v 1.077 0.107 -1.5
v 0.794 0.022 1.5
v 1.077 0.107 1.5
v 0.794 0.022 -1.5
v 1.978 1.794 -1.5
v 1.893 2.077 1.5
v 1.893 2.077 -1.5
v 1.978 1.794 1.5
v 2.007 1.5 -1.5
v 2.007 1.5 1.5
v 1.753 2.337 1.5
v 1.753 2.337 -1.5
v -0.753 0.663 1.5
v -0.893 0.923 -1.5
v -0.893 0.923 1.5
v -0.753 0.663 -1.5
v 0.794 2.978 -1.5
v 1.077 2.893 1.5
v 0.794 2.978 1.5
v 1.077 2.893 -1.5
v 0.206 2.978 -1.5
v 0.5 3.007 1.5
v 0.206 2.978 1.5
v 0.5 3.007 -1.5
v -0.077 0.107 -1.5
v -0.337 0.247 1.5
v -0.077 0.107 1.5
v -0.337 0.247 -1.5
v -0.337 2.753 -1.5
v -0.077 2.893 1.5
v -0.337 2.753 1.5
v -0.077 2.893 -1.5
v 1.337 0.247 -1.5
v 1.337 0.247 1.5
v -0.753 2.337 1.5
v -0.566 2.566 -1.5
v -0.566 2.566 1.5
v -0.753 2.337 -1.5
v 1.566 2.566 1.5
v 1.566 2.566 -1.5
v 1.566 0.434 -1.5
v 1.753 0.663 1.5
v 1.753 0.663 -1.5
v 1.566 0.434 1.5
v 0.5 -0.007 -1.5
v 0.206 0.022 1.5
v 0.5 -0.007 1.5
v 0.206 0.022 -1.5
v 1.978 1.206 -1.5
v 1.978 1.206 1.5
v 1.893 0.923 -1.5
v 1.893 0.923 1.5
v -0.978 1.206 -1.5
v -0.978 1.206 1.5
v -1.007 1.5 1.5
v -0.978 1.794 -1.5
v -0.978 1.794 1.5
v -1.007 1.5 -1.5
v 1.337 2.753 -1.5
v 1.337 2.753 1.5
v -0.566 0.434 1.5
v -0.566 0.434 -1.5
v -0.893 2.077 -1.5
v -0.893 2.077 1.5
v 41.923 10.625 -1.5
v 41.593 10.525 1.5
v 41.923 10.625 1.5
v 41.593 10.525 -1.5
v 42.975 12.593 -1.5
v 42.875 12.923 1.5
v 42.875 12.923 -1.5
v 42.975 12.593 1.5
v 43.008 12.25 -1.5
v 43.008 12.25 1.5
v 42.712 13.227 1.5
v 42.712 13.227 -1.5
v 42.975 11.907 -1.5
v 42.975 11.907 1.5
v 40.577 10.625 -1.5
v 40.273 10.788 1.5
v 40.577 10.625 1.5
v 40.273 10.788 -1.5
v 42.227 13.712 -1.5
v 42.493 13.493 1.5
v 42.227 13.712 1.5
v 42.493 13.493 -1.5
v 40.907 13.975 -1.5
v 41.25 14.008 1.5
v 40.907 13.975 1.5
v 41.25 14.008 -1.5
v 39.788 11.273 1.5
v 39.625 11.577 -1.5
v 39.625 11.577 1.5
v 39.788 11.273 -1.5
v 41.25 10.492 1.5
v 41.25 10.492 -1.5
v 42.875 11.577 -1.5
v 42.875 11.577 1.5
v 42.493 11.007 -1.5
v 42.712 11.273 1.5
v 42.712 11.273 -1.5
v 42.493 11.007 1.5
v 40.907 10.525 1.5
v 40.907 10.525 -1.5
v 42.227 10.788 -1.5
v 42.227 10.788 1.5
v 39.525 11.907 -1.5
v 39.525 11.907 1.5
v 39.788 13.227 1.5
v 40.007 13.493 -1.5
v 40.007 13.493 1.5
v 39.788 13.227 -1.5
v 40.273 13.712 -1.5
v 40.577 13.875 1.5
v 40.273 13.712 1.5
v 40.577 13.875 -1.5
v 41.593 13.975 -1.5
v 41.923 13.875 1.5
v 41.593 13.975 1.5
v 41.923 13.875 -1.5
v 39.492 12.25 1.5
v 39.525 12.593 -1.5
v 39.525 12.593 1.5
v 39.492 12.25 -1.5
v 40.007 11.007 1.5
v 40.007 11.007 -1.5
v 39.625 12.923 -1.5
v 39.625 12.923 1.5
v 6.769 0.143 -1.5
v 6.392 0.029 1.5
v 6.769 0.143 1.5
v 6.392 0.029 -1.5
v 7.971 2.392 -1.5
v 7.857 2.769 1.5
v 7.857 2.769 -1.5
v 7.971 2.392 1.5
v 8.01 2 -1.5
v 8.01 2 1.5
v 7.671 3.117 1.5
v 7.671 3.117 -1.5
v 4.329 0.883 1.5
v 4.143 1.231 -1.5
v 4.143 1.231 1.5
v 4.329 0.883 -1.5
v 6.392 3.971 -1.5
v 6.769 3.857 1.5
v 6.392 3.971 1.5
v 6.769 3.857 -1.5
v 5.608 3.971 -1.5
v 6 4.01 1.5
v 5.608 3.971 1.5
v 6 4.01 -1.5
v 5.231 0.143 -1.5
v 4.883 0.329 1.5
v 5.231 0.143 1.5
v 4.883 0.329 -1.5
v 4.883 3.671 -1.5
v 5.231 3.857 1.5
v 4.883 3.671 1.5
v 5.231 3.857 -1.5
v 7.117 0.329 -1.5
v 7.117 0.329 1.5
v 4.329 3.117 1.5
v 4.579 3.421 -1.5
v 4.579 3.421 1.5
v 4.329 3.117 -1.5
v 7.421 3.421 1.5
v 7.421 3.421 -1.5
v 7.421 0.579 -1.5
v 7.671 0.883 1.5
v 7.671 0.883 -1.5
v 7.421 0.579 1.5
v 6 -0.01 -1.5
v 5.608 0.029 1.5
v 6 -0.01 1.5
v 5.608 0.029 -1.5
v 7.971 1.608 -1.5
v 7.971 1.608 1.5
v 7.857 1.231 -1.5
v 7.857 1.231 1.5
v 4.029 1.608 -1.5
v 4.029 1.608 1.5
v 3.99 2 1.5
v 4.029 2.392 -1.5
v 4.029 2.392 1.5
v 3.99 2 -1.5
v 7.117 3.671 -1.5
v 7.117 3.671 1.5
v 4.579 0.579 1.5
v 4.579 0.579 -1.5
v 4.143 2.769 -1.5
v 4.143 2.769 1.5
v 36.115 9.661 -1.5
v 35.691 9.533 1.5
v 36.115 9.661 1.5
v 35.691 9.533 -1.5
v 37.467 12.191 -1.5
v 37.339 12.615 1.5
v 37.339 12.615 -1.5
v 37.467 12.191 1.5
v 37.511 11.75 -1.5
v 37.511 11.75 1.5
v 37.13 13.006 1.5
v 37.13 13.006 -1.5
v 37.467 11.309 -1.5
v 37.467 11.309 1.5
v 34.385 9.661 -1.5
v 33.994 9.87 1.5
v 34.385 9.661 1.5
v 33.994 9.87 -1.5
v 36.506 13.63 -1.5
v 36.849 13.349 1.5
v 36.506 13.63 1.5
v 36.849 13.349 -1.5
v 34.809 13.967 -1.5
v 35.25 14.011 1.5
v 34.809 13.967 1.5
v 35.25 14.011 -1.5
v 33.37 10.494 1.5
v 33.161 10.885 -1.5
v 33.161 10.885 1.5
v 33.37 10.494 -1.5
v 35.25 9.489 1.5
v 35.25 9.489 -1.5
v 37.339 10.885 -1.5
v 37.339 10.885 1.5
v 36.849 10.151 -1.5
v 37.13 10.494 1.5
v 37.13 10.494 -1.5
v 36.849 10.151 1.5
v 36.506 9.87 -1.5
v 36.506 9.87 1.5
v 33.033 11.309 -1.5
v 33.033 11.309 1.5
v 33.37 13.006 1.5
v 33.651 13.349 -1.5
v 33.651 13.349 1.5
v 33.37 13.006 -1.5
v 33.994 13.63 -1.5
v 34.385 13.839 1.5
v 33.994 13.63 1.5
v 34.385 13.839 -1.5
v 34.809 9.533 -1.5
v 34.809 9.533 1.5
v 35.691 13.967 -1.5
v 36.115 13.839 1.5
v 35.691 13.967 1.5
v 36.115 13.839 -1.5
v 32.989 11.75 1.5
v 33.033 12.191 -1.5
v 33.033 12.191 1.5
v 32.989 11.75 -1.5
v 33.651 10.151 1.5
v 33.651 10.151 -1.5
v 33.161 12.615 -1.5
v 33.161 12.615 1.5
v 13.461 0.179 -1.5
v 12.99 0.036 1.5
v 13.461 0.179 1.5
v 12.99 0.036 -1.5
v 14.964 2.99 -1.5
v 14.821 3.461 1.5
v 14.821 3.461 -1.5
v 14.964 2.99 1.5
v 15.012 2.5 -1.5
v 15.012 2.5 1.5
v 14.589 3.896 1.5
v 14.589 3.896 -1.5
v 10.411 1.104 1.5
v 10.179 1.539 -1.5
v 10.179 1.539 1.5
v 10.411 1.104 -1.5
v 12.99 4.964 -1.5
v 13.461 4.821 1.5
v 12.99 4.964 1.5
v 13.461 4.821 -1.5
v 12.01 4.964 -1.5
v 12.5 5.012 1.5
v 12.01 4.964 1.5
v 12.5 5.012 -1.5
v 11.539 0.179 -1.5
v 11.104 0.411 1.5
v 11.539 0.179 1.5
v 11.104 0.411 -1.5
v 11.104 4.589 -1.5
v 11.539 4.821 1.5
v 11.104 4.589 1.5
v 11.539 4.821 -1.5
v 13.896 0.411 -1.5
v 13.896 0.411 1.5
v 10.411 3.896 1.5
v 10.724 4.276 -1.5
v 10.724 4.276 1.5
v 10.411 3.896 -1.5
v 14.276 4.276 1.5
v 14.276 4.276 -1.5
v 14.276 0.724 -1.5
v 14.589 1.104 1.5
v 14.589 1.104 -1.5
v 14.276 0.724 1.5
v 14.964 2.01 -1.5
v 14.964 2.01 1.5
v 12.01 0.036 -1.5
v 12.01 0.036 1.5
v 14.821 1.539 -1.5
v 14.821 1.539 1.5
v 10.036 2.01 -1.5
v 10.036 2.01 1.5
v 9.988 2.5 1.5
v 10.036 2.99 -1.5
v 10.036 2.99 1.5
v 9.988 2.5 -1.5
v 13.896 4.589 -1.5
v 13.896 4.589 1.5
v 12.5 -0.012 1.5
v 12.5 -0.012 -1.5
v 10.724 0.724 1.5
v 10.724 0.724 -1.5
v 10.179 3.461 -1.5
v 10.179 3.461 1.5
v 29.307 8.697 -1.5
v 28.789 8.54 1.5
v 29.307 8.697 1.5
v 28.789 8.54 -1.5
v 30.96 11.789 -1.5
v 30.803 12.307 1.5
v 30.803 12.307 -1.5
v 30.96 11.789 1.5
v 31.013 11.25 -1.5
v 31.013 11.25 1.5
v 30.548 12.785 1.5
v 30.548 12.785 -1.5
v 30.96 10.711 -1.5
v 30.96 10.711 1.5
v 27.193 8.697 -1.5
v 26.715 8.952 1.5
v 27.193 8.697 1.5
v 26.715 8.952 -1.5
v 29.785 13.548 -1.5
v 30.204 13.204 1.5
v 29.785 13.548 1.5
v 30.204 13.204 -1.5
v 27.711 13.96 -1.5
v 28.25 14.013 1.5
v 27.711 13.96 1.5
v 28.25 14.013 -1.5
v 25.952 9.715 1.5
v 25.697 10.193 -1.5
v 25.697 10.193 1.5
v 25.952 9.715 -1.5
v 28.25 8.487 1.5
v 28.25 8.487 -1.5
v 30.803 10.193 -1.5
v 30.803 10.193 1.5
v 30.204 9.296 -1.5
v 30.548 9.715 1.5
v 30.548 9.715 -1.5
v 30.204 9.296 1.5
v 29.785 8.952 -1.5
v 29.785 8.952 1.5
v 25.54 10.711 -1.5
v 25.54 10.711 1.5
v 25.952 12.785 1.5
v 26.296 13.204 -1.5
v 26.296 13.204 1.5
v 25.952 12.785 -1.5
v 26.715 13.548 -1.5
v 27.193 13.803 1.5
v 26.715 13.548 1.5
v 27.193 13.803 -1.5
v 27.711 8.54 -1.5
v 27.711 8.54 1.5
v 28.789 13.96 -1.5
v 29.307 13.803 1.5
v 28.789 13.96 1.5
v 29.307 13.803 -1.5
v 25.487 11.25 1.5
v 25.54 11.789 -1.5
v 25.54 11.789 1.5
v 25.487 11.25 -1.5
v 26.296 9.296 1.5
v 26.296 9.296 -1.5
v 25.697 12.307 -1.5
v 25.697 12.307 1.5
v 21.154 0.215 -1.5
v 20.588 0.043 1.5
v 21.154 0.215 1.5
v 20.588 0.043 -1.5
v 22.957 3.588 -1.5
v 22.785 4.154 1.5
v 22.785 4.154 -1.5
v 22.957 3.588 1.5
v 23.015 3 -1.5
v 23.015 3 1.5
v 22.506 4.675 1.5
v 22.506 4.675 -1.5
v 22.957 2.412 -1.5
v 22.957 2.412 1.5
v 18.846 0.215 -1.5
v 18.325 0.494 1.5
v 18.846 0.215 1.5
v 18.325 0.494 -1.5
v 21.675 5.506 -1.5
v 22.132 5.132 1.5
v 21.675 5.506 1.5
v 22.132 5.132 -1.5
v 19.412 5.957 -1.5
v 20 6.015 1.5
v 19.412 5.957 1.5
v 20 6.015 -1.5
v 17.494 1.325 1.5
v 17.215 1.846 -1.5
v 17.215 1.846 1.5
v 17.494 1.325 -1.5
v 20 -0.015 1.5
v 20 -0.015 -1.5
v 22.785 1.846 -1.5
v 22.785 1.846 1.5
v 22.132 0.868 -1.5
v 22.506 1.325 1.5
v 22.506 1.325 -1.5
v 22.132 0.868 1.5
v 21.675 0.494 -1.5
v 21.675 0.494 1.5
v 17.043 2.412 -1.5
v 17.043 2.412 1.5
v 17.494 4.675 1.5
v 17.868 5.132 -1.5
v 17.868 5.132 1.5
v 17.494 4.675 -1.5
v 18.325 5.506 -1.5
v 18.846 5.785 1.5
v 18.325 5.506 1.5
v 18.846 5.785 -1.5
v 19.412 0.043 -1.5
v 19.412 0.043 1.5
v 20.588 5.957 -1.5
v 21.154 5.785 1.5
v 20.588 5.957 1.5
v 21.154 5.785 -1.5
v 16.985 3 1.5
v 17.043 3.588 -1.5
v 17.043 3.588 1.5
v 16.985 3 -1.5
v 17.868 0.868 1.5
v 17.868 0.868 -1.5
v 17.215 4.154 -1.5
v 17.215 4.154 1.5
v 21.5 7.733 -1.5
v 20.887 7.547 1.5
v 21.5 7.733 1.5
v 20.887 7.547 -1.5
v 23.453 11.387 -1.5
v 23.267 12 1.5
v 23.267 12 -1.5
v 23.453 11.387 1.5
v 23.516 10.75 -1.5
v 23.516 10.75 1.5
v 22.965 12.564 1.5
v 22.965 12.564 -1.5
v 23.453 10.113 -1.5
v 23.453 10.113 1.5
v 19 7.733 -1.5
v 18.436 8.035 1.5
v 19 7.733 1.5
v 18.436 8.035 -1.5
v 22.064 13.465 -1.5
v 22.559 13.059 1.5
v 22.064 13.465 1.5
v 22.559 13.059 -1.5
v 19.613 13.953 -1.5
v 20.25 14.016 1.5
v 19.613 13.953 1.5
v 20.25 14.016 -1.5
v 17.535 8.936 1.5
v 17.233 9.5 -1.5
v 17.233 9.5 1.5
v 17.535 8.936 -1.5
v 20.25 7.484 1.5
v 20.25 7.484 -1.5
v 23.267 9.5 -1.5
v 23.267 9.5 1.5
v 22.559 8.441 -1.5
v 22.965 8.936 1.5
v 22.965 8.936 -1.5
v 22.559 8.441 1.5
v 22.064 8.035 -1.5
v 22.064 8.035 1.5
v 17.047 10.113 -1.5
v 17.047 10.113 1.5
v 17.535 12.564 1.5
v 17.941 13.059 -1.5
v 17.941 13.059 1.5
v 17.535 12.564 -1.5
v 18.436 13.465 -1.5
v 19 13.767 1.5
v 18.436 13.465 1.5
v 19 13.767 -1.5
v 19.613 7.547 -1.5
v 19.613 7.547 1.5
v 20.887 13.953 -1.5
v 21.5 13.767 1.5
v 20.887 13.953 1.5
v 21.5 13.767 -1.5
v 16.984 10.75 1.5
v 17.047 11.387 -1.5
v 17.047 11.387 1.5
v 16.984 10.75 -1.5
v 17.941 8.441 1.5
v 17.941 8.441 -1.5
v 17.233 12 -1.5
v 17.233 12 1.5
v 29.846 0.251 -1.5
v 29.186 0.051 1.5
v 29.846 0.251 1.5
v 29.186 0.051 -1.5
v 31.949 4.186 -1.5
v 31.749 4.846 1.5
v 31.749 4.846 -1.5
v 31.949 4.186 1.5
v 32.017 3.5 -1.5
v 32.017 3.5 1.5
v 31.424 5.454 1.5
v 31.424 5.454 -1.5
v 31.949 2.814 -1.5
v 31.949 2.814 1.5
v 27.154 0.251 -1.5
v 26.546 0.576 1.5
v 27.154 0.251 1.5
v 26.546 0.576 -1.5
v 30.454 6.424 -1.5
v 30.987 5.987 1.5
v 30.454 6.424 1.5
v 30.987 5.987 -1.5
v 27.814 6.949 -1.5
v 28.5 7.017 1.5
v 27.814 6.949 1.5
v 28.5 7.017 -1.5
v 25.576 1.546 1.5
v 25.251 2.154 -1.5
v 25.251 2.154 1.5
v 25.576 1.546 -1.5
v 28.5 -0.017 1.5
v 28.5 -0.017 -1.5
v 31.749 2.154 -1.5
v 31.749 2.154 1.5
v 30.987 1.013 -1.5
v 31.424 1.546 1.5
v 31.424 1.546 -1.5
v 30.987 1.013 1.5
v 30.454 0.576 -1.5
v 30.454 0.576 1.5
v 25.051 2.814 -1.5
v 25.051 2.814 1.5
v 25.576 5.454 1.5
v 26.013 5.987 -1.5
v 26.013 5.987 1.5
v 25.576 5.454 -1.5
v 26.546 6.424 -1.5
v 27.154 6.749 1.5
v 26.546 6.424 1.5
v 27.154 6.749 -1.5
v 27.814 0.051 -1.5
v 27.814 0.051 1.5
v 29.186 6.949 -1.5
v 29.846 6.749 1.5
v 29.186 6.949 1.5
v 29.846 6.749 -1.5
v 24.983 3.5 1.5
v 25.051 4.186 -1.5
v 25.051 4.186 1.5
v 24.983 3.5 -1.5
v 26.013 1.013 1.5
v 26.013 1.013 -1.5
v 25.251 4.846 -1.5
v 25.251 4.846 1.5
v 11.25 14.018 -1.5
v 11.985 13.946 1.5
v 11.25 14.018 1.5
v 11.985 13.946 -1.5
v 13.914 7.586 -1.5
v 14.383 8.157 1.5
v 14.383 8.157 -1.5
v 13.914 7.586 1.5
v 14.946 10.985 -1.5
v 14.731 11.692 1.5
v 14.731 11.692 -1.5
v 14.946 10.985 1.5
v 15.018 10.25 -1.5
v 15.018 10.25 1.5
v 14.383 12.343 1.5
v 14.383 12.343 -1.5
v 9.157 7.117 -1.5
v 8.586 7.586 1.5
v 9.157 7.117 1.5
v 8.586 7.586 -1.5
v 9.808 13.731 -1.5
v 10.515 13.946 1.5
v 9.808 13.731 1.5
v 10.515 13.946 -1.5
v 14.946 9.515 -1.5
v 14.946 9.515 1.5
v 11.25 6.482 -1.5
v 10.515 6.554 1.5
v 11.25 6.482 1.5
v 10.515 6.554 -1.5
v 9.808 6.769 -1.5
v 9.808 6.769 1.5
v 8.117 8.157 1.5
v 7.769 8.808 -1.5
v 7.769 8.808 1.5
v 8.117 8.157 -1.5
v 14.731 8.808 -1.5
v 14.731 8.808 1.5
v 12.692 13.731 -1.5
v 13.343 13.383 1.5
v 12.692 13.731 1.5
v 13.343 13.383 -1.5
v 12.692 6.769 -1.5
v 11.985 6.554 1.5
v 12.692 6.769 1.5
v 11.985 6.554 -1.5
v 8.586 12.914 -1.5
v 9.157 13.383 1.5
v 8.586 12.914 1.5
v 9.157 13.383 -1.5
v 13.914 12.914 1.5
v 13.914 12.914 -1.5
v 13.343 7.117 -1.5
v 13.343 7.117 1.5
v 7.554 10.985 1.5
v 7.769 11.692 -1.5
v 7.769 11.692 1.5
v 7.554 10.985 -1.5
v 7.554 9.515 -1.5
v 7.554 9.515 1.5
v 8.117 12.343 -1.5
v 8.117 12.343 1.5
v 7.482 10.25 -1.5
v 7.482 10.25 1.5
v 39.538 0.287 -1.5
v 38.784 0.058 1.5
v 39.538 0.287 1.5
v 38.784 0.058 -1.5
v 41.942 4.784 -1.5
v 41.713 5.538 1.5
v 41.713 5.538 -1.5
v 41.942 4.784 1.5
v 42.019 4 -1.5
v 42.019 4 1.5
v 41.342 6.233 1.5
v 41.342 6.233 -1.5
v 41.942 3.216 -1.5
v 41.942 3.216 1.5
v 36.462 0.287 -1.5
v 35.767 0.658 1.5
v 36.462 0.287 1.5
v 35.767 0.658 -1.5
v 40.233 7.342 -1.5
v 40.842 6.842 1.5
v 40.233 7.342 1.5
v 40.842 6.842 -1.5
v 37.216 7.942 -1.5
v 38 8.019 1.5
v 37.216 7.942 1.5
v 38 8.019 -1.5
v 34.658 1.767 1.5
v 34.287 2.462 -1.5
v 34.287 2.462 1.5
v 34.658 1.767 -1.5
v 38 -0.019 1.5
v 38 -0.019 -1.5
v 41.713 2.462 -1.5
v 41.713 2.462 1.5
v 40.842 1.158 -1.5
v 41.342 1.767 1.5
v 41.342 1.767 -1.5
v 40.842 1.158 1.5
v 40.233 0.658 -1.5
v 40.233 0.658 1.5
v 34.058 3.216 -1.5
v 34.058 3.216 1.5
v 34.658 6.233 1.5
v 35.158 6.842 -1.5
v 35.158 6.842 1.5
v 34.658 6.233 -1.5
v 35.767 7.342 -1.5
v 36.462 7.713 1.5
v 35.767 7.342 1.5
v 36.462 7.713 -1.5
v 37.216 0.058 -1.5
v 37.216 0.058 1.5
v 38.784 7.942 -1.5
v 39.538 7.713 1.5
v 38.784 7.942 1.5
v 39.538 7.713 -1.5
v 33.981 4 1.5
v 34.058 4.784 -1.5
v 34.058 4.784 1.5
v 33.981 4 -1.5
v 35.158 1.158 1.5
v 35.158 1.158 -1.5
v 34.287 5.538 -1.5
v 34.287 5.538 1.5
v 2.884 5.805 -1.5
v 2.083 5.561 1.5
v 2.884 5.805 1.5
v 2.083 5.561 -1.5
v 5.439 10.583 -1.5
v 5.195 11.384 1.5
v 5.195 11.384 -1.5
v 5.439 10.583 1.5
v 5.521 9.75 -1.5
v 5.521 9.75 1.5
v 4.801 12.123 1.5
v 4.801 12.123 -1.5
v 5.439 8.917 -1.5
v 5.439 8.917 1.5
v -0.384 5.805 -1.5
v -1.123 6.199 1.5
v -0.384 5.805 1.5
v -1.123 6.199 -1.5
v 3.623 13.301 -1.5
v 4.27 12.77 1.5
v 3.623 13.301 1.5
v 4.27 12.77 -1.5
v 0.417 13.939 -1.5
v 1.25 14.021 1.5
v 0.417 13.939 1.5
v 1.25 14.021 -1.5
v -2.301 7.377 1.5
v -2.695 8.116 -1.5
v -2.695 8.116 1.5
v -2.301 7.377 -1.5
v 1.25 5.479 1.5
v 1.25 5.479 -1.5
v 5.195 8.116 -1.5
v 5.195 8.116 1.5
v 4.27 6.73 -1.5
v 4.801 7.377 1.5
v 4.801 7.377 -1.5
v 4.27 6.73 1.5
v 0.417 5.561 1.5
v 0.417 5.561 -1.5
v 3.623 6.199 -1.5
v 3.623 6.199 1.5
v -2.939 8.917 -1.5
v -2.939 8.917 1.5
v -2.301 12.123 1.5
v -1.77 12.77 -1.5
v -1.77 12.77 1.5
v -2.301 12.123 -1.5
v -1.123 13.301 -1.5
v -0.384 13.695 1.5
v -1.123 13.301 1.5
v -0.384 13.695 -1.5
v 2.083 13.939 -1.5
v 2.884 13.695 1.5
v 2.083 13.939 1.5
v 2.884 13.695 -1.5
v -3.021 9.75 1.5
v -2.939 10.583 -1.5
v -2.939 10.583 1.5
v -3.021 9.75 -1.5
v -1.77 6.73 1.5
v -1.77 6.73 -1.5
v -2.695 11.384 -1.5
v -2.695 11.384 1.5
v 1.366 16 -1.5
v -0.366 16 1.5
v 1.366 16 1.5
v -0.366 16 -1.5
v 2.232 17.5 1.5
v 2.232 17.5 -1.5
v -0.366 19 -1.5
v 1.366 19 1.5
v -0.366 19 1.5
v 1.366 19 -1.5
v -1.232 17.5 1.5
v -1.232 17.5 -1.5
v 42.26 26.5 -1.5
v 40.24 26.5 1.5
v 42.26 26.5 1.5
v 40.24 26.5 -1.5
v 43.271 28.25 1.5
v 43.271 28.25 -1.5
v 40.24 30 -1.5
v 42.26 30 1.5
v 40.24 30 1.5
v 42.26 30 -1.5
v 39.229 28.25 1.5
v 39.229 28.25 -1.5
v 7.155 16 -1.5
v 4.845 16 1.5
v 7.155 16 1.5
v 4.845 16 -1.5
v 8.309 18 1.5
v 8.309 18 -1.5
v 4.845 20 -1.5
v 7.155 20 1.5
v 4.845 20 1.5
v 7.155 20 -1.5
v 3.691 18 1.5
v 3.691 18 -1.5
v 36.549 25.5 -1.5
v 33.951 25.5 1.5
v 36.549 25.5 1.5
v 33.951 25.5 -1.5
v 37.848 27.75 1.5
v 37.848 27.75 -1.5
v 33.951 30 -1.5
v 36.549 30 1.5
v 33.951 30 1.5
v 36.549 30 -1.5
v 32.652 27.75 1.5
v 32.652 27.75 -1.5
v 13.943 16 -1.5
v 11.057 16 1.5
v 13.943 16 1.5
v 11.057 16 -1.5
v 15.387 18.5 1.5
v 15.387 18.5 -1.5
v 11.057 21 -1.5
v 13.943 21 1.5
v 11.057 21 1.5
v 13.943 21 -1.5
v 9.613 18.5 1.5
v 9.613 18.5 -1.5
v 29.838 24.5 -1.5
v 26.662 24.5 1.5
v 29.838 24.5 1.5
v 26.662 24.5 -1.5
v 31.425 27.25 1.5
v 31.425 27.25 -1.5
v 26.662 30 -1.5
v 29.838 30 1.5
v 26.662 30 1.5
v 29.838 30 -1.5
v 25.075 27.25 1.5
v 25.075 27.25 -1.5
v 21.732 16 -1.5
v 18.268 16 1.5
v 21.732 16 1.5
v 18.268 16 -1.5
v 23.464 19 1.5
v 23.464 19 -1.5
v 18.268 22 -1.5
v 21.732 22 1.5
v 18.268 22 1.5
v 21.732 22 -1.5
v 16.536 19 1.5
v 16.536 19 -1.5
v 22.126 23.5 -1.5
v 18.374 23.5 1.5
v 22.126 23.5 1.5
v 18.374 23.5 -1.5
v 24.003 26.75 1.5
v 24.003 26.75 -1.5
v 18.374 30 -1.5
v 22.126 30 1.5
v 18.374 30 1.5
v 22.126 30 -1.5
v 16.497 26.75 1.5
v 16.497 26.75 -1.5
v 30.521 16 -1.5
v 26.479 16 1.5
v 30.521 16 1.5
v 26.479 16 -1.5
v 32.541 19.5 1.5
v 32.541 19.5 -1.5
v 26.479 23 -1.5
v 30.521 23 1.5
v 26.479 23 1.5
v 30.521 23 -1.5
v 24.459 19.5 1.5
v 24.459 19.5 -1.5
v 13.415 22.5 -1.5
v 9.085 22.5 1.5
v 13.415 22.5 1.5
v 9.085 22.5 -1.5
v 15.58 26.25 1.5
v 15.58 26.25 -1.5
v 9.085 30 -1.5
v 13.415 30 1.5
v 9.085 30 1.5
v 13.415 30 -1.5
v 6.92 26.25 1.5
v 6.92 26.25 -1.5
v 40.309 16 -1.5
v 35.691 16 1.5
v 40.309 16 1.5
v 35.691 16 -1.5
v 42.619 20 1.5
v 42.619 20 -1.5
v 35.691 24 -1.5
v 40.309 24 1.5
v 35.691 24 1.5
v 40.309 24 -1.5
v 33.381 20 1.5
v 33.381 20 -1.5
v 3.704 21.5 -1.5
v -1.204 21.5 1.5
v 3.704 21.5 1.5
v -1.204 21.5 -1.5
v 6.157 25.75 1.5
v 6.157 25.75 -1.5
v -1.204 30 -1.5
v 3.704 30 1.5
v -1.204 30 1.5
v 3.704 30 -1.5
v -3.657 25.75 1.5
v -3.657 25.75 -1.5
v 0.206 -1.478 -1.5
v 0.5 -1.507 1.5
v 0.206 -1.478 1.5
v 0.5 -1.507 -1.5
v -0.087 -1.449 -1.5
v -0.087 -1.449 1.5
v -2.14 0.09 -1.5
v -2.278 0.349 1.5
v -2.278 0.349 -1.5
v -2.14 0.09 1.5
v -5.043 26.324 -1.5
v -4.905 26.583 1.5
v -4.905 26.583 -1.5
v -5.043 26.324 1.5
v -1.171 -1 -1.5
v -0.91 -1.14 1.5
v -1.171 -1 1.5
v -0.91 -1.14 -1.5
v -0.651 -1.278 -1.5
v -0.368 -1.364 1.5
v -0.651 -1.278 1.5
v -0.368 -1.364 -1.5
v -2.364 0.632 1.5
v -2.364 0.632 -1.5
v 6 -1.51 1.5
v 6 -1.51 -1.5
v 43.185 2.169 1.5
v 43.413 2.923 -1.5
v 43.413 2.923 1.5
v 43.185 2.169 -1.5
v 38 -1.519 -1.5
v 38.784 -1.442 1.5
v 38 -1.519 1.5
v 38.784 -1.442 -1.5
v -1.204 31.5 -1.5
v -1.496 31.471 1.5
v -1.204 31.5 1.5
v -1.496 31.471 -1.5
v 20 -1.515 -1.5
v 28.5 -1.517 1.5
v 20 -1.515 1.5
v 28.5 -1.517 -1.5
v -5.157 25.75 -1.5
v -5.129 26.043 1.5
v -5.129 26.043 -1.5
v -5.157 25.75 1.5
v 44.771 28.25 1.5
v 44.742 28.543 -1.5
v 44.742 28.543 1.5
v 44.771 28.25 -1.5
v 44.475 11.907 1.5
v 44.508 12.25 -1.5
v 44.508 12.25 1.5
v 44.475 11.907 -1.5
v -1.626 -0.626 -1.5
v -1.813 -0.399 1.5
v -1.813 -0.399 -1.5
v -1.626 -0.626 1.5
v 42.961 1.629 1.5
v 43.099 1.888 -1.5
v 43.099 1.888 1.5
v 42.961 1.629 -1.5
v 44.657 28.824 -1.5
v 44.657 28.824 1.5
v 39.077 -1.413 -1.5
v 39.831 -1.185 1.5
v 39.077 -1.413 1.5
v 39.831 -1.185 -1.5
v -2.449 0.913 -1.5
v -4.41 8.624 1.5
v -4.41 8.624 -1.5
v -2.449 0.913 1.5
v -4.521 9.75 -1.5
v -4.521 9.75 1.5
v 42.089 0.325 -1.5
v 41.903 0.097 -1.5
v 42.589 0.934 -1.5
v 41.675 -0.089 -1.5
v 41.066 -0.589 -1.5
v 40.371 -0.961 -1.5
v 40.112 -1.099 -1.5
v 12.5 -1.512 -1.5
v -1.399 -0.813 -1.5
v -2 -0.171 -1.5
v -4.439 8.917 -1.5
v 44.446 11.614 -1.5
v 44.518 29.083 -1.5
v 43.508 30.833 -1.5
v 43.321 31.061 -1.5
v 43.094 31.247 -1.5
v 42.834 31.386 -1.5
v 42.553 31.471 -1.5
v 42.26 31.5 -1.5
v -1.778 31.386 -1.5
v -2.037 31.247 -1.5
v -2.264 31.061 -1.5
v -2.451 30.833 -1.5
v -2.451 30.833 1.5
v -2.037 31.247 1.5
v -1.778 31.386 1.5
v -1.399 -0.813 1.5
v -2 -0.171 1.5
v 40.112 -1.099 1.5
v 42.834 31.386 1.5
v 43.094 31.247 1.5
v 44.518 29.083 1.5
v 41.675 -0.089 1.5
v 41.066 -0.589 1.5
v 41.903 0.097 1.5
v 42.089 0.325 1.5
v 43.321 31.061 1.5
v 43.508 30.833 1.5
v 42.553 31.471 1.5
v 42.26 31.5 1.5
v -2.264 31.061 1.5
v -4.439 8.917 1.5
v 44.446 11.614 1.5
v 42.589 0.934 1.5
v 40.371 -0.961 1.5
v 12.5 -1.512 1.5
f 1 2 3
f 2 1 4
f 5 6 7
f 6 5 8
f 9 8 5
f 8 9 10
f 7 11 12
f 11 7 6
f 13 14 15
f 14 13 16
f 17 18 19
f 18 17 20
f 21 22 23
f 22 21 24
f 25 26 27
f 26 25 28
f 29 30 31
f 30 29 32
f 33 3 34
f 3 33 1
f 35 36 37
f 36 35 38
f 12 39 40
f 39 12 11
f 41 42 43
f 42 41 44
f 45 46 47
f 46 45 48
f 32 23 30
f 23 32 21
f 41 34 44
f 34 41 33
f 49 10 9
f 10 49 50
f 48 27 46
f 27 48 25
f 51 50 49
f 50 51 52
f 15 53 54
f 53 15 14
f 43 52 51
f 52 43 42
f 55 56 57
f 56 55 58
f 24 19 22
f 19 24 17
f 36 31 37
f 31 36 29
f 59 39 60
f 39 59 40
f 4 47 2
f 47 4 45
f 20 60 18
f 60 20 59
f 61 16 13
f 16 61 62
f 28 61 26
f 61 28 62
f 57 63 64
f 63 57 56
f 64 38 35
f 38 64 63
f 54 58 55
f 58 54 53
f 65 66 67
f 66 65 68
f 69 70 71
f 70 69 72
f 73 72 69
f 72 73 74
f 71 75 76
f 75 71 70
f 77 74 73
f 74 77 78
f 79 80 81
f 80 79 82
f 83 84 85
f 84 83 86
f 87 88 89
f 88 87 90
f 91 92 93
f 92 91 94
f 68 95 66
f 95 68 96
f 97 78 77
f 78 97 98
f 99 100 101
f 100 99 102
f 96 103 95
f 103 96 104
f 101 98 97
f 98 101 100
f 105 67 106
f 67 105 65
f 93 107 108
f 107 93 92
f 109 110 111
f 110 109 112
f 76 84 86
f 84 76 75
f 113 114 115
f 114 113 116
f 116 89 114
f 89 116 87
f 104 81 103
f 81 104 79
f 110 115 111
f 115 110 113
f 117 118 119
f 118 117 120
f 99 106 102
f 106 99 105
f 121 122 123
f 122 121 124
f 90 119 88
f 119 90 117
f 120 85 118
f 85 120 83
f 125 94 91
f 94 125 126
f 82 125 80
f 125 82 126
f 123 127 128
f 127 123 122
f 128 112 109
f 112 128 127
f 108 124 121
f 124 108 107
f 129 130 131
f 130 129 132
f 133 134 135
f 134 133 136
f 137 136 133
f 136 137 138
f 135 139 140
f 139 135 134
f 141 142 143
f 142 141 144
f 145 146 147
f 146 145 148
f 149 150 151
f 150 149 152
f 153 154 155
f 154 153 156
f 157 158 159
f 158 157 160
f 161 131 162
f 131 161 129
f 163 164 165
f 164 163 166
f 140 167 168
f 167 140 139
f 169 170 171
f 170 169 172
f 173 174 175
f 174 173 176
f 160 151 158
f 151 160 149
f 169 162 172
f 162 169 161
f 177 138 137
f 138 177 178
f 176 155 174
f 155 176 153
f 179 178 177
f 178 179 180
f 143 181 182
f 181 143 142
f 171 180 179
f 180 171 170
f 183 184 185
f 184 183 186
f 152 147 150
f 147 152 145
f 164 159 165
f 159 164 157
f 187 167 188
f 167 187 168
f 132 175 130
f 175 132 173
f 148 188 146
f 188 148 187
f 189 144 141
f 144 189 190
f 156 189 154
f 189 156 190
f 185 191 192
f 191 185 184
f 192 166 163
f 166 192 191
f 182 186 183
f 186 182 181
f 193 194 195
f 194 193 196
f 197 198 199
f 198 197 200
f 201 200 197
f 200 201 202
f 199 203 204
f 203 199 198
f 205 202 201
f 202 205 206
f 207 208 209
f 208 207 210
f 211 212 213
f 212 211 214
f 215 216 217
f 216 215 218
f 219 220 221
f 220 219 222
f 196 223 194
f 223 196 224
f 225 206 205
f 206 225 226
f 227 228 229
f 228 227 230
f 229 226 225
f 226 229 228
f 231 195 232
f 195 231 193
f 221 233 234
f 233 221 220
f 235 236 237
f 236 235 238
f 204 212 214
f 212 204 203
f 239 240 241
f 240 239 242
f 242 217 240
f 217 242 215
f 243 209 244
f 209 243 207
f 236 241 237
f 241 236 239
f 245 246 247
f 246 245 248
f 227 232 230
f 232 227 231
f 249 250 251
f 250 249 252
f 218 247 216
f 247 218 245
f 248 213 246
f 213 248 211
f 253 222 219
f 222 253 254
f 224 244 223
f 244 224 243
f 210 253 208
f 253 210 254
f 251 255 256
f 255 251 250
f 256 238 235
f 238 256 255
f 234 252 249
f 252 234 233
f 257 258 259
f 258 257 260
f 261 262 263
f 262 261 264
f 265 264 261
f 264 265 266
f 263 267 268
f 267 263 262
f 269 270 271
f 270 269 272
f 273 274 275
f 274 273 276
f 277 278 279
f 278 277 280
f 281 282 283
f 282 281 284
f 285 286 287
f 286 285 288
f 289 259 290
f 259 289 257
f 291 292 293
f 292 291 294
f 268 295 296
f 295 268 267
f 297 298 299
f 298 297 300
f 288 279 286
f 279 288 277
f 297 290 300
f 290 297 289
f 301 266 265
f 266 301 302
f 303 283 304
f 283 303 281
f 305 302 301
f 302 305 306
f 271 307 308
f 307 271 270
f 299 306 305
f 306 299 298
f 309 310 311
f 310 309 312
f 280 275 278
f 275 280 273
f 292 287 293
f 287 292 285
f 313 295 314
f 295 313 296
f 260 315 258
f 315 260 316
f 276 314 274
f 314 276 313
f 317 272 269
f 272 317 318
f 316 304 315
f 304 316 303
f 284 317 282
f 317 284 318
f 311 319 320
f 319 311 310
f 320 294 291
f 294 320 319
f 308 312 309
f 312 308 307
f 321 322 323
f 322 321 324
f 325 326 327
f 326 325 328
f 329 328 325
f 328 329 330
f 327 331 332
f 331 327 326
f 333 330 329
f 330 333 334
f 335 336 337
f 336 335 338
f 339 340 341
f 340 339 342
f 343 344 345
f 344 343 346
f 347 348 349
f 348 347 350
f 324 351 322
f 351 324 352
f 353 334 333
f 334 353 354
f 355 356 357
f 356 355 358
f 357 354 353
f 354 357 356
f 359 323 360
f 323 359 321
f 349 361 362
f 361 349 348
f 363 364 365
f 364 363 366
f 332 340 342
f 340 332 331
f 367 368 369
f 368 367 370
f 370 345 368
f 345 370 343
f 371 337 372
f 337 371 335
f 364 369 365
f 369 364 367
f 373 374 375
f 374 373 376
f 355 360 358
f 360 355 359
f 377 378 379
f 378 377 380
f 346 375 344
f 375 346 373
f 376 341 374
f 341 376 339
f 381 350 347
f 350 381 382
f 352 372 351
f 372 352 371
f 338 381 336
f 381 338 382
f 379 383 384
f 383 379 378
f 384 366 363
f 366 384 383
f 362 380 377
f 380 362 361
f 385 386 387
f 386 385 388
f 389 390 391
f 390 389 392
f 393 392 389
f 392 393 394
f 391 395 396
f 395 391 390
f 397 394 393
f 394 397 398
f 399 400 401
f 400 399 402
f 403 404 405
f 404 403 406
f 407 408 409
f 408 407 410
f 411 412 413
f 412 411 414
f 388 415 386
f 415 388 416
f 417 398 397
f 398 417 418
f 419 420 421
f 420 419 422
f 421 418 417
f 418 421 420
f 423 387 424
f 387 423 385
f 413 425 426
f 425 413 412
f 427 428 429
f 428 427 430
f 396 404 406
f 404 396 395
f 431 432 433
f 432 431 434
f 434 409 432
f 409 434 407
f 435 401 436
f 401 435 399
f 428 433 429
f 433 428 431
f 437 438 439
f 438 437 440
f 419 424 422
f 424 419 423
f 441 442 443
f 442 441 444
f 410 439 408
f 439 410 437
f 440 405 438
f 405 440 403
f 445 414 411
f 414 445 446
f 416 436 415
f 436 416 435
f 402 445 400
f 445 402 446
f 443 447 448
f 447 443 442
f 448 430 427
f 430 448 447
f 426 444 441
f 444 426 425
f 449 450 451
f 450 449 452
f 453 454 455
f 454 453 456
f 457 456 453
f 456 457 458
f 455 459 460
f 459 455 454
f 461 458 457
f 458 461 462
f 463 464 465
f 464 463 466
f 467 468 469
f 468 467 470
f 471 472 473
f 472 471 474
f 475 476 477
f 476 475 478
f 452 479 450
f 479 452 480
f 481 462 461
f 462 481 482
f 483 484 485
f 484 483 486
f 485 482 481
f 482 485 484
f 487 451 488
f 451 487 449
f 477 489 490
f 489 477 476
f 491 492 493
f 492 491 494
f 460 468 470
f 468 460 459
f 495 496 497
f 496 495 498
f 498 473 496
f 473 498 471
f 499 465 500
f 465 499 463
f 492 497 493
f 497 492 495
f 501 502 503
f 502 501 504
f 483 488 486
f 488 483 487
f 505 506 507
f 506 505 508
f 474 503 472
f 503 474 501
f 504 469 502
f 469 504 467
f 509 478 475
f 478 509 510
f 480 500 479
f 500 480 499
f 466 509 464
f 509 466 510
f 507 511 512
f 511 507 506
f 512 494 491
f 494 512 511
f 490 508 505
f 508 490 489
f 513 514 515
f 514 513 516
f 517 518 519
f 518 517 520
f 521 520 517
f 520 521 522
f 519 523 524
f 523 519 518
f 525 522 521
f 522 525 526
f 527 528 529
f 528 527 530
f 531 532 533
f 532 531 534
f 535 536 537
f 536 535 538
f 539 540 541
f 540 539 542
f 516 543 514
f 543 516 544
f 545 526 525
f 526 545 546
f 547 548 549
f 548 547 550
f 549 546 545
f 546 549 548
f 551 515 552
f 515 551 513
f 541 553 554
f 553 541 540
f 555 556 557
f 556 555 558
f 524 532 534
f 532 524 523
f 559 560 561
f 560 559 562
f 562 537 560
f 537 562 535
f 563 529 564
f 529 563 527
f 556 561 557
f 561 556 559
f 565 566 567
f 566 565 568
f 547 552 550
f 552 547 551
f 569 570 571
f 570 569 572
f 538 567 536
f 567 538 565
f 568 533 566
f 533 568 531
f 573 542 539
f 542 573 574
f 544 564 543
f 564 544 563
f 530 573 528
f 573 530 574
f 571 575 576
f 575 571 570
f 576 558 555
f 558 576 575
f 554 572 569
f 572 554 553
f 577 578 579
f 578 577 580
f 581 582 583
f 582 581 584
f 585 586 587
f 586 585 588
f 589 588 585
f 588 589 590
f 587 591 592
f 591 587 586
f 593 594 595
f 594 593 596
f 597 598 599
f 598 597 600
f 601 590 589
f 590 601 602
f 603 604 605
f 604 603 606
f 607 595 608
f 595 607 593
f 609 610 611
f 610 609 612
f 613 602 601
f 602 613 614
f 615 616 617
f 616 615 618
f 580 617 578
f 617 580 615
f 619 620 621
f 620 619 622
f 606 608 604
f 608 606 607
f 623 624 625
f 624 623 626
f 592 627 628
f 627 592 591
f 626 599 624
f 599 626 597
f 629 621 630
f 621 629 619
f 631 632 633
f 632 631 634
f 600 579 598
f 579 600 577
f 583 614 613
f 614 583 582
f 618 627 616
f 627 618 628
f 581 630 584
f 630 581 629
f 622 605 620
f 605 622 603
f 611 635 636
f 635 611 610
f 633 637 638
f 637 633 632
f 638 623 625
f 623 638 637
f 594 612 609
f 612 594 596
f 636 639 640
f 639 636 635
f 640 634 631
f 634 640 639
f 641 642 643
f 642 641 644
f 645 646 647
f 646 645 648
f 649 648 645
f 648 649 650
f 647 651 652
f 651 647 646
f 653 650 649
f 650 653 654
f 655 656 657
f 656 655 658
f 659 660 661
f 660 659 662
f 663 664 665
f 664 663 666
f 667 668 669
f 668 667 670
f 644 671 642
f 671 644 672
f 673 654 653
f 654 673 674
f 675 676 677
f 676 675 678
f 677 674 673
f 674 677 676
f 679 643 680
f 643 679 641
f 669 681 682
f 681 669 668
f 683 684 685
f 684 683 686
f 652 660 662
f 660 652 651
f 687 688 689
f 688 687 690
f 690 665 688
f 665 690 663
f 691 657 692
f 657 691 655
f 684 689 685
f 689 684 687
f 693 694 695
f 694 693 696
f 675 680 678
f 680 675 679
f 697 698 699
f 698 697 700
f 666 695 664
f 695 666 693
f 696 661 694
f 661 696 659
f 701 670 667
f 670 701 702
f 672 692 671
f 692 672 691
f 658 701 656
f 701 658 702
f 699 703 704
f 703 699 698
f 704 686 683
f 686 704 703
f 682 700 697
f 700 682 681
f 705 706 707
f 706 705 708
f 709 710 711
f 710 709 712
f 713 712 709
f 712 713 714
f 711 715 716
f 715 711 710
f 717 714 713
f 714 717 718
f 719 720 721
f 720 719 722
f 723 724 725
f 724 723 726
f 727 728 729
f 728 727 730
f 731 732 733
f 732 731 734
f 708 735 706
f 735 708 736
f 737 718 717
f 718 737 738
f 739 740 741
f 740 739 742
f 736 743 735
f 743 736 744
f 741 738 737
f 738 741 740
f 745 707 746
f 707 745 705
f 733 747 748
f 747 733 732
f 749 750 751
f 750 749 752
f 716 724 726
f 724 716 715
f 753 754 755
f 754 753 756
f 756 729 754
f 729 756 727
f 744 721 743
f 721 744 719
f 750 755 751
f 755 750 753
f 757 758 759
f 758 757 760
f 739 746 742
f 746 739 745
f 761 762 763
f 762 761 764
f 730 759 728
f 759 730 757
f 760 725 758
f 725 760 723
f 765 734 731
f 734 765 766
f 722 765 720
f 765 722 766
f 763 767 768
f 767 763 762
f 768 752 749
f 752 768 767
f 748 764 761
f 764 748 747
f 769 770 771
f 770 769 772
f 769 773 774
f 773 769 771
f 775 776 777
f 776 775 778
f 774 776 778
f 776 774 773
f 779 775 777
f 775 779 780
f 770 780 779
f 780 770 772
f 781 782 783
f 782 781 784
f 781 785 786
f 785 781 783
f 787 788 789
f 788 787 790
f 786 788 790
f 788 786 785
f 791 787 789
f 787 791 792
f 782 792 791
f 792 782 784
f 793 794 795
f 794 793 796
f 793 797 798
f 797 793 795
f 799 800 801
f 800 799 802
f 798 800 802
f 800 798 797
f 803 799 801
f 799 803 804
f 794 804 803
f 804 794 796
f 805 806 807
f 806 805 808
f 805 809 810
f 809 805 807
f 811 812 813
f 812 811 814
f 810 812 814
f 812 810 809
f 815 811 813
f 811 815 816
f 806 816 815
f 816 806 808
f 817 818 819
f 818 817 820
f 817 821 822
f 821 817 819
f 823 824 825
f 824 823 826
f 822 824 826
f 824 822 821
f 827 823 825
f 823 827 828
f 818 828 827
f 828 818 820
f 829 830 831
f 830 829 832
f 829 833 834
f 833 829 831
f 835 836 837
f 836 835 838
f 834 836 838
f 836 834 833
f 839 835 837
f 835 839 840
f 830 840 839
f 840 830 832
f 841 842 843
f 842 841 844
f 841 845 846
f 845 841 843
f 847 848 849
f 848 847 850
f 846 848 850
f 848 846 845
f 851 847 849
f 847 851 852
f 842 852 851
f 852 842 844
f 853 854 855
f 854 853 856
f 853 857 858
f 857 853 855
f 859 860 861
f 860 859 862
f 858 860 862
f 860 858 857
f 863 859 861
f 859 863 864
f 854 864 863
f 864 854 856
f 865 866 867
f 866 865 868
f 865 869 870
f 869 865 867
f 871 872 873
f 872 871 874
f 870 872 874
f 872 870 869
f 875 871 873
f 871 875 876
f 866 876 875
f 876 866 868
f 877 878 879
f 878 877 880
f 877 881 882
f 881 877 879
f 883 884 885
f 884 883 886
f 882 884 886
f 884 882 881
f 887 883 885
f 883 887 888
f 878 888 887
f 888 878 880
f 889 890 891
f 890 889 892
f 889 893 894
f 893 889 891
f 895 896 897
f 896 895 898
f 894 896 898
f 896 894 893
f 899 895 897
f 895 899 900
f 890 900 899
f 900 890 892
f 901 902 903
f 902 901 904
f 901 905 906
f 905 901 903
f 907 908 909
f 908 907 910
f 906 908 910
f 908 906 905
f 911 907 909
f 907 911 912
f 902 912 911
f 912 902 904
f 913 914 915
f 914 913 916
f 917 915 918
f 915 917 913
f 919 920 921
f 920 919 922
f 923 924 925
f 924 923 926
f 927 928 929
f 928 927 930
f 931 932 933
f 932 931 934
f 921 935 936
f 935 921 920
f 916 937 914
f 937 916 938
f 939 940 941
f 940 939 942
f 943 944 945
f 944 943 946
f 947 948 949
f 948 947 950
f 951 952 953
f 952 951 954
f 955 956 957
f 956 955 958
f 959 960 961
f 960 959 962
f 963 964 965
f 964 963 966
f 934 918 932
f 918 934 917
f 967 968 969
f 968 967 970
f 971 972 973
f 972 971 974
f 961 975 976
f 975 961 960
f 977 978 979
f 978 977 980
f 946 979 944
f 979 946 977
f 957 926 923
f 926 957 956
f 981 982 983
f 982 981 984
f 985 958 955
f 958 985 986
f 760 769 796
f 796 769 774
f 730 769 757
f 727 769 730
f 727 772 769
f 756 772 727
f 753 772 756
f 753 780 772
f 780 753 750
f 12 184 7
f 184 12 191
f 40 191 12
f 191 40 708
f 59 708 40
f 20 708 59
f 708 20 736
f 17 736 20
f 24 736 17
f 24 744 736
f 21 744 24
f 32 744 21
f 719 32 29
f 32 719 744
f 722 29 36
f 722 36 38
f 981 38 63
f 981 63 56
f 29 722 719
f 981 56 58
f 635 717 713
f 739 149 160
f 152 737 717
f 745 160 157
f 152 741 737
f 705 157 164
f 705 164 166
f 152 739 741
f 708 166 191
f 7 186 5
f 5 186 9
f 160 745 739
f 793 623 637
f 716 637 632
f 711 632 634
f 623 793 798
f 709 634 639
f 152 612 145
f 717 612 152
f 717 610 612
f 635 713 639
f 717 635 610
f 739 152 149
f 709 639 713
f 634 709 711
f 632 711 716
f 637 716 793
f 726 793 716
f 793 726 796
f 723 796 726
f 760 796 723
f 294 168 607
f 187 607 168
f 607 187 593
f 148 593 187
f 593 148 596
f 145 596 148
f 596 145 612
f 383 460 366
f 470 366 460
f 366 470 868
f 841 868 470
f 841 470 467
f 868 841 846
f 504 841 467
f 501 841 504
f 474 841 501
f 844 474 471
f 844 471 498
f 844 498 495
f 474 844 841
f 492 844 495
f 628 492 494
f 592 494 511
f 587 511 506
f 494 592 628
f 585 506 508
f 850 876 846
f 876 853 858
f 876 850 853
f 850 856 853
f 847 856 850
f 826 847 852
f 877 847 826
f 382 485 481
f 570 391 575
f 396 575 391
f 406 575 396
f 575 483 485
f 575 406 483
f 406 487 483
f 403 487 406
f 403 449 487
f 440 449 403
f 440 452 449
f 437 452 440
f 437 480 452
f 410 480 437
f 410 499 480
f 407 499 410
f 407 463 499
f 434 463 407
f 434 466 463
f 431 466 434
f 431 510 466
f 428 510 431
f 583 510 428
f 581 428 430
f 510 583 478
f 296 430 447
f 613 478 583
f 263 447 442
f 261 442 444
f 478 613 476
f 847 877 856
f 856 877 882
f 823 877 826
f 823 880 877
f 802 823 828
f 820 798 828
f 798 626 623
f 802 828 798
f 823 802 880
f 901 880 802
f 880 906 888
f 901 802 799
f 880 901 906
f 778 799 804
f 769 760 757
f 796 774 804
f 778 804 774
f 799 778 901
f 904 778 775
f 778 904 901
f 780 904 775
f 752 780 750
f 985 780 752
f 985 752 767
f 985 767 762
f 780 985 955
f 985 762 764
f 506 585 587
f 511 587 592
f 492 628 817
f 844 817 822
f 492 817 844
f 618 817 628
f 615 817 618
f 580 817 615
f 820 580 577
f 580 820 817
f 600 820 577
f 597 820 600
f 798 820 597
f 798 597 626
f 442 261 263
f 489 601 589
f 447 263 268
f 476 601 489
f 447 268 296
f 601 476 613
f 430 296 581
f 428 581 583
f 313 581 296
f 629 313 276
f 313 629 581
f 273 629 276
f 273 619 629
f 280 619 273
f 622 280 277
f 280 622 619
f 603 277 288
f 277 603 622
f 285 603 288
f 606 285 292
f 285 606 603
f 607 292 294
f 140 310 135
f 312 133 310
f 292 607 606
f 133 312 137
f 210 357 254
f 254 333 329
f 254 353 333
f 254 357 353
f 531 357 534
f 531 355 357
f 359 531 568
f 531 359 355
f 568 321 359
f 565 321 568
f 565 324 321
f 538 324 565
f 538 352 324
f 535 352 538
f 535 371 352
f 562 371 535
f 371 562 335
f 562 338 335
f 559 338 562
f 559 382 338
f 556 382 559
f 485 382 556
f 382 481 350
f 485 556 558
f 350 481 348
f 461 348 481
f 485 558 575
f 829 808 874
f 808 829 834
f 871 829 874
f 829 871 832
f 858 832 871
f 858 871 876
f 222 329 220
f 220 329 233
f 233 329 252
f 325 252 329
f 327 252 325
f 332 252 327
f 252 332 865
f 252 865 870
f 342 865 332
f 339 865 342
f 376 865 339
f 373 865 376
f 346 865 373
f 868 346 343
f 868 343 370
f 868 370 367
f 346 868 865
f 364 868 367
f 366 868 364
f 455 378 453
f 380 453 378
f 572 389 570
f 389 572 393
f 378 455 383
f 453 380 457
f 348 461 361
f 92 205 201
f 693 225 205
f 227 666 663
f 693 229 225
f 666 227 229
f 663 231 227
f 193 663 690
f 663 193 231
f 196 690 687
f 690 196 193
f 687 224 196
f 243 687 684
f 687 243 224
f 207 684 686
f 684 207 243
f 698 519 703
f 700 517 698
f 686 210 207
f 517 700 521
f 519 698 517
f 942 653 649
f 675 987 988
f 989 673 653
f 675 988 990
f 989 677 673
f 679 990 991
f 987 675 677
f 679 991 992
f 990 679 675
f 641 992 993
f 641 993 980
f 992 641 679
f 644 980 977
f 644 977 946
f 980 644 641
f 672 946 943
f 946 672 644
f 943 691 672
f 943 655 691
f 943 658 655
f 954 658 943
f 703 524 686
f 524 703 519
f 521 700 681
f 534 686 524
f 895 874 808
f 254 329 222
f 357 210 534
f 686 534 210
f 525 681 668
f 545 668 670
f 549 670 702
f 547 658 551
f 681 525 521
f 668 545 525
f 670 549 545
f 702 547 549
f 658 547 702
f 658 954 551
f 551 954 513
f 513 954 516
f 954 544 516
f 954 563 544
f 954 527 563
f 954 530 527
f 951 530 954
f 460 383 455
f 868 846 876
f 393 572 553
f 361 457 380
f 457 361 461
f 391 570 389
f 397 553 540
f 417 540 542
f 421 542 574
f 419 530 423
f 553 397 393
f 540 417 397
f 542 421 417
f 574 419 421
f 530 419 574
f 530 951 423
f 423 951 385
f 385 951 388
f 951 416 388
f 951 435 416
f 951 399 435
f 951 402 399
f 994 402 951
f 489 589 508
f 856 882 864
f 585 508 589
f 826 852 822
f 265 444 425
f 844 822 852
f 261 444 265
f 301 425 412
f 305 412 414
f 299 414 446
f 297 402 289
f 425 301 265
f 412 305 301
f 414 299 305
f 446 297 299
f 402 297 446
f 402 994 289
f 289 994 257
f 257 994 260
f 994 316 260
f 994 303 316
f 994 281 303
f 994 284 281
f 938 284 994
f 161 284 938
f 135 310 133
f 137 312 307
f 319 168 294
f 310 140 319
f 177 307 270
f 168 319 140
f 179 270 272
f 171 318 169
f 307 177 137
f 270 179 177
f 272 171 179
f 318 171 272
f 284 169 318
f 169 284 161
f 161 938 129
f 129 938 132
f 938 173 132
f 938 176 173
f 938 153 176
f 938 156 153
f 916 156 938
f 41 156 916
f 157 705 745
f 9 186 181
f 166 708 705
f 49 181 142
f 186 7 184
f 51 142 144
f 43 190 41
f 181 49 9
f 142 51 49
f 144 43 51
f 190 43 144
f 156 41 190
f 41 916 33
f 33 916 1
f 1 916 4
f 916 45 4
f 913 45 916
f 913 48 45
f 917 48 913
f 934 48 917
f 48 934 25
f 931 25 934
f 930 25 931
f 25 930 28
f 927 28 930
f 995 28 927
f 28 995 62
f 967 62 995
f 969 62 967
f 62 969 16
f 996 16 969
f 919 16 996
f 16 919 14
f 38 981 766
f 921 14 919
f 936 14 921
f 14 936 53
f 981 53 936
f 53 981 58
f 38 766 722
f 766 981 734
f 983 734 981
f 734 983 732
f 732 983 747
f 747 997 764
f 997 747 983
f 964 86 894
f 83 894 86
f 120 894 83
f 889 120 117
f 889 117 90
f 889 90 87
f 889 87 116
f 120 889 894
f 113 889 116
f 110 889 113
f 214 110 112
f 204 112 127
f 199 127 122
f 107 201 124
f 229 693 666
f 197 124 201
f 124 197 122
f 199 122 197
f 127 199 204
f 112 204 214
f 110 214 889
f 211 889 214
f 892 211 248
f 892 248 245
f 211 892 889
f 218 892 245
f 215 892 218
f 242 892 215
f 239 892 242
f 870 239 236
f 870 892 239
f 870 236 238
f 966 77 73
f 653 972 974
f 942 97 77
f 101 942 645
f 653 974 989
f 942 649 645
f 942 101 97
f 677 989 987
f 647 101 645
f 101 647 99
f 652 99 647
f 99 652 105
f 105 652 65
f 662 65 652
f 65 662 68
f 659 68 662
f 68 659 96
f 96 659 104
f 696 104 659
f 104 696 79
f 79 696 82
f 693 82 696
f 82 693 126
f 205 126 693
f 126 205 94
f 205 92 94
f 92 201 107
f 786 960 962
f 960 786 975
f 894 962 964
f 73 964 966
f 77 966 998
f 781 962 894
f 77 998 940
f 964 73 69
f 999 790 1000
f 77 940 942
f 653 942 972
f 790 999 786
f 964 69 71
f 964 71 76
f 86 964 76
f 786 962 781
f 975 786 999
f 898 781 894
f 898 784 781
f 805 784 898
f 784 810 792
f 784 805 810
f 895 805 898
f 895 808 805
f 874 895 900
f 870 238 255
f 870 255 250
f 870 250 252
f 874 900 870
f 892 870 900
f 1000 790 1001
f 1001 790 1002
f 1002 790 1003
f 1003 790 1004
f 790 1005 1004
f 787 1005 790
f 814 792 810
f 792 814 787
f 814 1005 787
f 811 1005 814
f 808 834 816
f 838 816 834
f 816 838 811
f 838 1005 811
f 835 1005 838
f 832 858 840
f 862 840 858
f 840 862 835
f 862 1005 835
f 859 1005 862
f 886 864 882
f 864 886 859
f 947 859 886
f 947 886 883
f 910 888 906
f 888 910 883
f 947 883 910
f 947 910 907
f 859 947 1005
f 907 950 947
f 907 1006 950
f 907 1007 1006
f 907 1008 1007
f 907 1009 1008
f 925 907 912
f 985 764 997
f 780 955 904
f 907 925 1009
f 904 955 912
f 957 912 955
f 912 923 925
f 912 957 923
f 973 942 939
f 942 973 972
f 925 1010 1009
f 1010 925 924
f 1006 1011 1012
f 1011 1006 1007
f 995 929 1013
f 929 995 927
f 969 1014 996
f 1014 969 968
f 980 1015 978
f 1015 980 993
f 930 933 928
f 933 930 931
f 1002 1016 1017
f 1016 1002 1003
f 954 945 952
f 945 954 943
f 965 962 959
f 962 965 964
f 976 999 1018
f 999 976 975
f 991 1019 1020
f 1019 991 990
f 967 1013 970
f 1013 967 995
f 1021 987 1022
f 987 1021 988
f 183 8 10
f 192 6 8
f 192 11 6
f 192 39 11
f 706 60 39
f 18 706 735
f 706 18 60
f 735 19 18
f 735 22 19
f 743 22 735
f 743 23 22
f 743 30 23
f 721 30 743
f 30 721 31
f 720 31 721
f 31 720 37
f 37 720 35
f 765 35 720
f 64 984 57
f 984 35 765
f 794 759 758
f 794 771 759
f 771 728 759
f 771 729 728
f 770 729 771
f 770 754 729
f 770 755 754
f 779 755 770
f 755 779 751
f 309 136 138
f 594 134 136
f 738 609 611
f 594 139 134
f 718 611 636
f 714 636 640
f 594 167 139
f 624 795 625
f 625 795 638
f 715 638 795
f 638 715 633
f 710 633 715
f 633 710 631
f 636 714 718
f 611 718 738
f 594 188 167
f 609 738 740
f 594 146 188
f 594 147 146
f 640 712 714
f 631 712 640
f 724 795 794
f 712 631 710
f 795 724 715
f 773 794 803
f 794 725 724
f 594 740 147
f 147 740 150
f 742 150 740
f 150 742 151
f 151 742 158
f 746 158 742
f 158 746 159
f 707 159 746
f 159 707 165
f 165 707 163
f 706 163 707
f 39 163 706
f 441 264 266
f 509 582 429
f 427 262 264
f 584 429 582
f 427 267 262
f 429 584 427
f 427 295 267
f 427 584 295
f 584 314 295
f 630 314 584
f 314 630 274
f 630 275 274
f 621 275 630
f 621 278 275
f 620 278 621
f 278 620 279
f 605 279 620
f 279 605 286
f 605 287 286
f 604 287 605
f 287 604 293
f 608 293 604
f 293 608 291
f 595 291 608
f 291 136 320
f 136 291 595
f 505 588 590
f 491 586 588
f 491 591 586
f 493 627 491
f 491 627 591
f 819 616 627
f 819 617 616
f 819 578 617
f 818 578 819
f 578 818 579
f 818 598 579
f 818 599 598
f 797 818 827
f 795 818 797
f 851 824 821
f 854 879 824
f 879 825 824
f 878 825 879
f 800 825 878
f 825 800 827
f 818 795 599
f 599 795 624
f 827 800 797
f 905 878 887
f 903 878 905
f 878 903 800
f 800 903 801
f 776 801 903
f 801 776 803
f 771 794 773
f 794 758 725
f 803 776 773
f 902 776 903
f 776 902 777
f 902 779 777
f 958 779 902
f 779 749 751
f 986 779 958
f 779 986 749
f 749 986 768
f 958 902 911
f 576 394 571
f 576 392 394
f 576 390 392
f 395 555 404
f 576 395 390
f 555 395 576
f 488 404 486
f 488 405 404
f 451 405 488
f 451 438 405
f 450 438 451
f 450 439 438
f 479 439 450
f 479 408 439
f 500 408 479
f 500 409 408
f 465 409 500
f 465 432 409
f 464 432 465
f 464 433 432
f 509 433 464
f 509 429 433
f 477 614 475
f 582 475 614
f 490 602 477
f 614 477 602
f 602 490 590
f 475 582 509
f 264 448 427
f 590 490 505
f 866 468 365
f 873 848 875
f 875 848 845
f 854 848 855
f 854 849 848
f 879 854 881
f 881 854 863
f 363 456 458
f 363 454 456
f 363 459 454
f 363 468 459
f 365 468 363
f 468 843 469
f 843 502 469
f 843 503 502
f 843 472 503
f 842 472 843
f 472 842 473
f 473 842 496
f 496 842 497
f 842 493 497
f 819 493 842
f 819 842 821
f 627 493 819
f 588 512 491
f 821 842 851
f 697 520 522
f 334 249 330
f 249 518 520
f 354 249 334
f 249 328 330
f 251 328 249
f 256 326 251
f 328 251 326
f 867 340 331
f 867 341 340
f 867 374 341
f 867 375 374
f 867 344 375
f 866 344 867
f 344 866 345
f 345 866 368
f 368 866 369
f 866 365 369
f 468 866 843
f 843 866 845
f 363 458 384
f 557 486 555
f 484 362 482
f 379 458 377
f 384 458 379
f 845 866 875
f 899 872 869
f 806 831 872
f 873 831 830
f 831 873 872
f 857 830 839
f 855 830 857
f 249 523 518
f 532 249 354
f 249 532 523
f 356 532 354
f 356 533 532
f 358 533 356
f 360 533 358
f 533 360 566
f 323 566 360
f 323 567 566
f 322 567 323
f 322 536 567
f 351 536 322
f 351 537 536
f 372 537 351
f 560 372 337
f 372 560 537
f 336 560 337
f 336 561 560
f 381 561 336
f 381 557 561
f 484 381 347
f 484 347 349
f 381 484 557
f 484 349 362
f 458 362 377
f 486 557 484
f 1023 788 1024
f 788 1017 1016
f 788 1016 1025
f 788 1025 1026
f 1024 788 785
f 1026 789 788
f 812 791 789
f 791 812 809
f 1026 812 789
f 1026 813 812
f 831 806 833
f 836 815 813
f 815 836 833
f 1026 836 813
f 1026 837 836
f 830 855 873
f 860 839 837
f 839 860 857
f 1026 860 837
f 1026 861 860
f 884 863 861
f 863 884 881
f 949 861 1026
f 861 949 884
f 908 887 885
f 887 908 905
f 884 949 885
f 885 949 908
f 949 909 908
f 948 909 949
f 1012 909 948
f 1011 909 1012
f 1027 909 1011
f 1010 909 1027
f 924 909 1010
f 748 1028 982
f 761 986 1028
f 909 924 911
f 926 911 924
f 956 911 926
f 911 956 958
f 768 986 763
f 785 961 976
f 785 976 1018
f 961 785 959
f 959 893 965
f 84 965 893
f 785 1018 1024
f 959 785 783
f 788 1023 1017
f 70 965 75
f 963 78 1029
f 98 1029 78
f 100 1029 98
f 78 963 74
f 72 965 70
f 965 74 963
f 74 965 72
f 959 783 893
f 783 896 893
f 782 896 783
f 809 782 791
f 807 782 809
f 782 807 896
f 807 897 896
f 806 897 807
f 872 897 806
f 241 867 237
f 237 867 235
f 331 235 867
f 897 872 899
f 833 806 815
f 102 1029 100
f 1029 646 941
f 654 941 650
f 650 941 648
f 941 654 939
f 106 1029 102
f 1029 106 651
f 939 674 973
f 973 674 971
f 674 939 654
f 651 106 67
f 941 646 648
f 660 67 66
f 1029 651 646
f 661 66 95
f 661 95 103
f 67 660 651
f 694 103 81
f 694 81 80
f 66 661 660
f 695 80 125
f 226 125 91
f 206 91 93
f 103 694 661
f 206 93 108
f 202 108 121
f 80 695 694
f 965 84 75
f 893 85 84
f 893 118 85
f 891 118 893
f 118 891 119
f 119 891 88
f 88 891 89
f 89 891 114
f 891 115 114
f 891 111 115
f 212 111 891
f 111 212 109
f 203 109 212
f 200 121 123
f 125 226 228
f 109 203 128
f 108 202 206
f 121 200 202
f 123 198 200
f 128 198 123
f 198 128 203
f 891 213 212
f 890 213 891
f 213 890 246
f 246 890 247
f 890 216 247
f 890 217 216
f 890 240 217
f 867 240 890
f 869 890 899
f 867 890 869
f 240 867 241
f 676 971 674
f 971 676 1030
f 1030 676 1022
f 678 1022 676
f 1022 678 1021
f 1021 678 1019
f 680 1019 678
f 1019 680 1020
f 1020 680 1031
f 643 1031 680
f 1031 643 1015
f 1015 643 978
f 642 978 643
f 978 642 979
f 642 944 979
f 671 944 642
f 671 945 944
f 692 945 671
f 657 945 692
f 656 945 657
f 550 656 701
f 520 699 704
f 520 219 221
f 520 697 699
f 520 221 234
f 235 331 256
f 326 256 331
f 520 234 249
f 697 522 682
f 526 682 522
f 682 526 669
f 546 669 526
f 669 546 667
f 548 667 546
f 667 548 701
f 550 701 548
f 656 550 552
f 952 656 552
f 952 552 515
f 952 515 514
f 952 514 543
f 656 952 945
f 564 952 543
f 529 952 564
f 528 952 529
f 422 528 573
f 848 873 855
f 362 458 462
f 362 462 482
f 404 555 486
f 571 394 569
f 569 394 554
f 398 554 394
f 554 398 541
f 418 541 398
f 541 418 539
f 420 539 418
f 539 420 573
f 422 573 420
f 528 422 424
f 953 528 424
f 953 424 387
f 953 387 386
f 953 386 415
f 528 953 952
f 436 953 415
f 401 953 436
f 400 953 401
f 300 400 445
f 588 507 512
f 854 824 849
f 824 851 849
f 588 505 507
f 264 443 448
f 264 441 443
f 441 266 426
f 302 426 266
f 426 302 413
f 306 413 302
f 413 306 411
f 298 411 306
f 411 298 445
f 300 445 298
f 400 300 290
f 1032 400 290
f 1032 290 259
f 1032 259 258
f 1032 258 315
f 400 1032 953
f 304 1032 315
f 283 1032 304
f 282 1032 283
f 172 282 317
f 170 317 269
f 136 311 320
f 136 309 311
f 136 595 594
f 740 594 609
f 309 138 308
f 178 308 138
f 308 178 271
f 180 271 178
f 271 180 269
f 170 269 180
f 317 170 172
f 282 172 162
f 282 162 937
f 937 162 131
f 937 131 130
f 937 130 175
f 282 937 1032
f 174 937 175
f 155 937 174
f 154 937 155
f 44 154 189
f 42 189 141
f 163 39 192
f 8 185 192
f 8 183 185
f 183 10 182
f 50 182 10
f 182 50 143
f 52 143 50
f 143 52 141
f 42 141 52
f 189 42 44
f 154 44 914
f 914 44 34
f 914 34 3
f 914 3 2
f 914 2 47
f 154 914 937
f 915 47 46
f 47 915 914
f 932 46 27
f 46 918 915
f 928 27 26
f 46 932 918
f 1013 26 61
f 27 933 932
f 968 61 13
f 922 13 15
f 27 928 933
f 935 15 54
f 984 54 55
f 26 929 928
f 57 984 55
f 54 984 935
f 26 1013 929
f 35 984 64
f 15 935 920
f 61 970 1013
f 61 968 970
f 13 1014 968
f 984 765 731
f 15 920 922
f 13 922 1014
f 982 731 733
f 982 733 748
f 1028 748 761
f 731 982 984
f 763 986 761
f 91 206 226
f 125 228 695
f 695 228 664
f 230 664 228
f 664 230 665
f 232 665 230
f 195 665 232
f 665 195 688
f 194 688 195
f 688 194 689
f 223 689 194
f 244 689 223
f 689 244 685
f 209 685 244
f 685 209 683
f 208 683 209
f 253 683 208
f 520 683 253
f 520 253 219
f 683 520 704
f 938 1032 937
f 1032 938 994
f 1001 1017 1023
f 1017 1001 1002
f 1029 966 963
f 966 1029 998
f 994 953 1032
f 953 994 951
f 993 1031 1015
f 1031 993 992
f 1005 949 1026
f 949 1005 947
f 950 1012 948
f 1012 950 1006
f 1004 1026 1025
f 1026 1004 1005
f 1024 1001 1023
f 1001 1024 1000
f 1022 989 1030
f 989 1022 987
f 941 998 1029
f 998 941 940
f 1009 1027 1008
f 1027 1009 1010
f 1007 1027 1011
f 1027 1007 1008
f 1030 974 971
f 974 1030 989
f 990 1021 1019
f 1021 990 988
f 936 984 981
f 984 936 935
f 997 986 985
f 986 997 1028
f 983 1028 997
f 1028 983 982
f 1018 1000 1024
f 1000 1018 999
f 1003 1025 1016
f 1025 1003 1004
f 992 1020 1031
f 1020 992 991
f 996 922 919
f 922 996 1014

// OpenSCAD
module hole(diameter, height, faces)
{
    actual_diameter = diameter / cos(180.0/faces);
    cylinder(d=actual_diameter, h=height, center=true, $fn=faces);
}

module ladder(faces, height)
{
union()
{
    for (i = [0:5])
    {
        diameter = i + 3.0;
        radius = diameter * 0.5;
 
        bottom = 0;
        left = -1 + i*(i-1)*0.5 + i*3.0 + i*2.0;
 
        translate([left + radius, bottom + radius, 0])
            hole(diameter, height, faces);
 
        diameter2 = i + 3.5;
        radius2 = diameter2 * 0.5;
 
        top = 14.0;
        right = 43 - (i*(i-1)*0.5 + i*3.5 + i*2.0);
 
        translate([right - radius2, top - radius2, 0])
            hole(diameter2, height, faces);
    }
}
}

difference()
{
    minkowski()
    {
        hull() union()
        {
            ladder(32, 1);
            translate([0, 16, 0]) ladder(6, 1);
        }
        
        cylinder(d=3.0, h=2.0, center=true, $fn=32);
    }
    union()
    {
        ladder(32, 6);
        translate([0, 16, 0]) ladder(6, 6);
    }
}
